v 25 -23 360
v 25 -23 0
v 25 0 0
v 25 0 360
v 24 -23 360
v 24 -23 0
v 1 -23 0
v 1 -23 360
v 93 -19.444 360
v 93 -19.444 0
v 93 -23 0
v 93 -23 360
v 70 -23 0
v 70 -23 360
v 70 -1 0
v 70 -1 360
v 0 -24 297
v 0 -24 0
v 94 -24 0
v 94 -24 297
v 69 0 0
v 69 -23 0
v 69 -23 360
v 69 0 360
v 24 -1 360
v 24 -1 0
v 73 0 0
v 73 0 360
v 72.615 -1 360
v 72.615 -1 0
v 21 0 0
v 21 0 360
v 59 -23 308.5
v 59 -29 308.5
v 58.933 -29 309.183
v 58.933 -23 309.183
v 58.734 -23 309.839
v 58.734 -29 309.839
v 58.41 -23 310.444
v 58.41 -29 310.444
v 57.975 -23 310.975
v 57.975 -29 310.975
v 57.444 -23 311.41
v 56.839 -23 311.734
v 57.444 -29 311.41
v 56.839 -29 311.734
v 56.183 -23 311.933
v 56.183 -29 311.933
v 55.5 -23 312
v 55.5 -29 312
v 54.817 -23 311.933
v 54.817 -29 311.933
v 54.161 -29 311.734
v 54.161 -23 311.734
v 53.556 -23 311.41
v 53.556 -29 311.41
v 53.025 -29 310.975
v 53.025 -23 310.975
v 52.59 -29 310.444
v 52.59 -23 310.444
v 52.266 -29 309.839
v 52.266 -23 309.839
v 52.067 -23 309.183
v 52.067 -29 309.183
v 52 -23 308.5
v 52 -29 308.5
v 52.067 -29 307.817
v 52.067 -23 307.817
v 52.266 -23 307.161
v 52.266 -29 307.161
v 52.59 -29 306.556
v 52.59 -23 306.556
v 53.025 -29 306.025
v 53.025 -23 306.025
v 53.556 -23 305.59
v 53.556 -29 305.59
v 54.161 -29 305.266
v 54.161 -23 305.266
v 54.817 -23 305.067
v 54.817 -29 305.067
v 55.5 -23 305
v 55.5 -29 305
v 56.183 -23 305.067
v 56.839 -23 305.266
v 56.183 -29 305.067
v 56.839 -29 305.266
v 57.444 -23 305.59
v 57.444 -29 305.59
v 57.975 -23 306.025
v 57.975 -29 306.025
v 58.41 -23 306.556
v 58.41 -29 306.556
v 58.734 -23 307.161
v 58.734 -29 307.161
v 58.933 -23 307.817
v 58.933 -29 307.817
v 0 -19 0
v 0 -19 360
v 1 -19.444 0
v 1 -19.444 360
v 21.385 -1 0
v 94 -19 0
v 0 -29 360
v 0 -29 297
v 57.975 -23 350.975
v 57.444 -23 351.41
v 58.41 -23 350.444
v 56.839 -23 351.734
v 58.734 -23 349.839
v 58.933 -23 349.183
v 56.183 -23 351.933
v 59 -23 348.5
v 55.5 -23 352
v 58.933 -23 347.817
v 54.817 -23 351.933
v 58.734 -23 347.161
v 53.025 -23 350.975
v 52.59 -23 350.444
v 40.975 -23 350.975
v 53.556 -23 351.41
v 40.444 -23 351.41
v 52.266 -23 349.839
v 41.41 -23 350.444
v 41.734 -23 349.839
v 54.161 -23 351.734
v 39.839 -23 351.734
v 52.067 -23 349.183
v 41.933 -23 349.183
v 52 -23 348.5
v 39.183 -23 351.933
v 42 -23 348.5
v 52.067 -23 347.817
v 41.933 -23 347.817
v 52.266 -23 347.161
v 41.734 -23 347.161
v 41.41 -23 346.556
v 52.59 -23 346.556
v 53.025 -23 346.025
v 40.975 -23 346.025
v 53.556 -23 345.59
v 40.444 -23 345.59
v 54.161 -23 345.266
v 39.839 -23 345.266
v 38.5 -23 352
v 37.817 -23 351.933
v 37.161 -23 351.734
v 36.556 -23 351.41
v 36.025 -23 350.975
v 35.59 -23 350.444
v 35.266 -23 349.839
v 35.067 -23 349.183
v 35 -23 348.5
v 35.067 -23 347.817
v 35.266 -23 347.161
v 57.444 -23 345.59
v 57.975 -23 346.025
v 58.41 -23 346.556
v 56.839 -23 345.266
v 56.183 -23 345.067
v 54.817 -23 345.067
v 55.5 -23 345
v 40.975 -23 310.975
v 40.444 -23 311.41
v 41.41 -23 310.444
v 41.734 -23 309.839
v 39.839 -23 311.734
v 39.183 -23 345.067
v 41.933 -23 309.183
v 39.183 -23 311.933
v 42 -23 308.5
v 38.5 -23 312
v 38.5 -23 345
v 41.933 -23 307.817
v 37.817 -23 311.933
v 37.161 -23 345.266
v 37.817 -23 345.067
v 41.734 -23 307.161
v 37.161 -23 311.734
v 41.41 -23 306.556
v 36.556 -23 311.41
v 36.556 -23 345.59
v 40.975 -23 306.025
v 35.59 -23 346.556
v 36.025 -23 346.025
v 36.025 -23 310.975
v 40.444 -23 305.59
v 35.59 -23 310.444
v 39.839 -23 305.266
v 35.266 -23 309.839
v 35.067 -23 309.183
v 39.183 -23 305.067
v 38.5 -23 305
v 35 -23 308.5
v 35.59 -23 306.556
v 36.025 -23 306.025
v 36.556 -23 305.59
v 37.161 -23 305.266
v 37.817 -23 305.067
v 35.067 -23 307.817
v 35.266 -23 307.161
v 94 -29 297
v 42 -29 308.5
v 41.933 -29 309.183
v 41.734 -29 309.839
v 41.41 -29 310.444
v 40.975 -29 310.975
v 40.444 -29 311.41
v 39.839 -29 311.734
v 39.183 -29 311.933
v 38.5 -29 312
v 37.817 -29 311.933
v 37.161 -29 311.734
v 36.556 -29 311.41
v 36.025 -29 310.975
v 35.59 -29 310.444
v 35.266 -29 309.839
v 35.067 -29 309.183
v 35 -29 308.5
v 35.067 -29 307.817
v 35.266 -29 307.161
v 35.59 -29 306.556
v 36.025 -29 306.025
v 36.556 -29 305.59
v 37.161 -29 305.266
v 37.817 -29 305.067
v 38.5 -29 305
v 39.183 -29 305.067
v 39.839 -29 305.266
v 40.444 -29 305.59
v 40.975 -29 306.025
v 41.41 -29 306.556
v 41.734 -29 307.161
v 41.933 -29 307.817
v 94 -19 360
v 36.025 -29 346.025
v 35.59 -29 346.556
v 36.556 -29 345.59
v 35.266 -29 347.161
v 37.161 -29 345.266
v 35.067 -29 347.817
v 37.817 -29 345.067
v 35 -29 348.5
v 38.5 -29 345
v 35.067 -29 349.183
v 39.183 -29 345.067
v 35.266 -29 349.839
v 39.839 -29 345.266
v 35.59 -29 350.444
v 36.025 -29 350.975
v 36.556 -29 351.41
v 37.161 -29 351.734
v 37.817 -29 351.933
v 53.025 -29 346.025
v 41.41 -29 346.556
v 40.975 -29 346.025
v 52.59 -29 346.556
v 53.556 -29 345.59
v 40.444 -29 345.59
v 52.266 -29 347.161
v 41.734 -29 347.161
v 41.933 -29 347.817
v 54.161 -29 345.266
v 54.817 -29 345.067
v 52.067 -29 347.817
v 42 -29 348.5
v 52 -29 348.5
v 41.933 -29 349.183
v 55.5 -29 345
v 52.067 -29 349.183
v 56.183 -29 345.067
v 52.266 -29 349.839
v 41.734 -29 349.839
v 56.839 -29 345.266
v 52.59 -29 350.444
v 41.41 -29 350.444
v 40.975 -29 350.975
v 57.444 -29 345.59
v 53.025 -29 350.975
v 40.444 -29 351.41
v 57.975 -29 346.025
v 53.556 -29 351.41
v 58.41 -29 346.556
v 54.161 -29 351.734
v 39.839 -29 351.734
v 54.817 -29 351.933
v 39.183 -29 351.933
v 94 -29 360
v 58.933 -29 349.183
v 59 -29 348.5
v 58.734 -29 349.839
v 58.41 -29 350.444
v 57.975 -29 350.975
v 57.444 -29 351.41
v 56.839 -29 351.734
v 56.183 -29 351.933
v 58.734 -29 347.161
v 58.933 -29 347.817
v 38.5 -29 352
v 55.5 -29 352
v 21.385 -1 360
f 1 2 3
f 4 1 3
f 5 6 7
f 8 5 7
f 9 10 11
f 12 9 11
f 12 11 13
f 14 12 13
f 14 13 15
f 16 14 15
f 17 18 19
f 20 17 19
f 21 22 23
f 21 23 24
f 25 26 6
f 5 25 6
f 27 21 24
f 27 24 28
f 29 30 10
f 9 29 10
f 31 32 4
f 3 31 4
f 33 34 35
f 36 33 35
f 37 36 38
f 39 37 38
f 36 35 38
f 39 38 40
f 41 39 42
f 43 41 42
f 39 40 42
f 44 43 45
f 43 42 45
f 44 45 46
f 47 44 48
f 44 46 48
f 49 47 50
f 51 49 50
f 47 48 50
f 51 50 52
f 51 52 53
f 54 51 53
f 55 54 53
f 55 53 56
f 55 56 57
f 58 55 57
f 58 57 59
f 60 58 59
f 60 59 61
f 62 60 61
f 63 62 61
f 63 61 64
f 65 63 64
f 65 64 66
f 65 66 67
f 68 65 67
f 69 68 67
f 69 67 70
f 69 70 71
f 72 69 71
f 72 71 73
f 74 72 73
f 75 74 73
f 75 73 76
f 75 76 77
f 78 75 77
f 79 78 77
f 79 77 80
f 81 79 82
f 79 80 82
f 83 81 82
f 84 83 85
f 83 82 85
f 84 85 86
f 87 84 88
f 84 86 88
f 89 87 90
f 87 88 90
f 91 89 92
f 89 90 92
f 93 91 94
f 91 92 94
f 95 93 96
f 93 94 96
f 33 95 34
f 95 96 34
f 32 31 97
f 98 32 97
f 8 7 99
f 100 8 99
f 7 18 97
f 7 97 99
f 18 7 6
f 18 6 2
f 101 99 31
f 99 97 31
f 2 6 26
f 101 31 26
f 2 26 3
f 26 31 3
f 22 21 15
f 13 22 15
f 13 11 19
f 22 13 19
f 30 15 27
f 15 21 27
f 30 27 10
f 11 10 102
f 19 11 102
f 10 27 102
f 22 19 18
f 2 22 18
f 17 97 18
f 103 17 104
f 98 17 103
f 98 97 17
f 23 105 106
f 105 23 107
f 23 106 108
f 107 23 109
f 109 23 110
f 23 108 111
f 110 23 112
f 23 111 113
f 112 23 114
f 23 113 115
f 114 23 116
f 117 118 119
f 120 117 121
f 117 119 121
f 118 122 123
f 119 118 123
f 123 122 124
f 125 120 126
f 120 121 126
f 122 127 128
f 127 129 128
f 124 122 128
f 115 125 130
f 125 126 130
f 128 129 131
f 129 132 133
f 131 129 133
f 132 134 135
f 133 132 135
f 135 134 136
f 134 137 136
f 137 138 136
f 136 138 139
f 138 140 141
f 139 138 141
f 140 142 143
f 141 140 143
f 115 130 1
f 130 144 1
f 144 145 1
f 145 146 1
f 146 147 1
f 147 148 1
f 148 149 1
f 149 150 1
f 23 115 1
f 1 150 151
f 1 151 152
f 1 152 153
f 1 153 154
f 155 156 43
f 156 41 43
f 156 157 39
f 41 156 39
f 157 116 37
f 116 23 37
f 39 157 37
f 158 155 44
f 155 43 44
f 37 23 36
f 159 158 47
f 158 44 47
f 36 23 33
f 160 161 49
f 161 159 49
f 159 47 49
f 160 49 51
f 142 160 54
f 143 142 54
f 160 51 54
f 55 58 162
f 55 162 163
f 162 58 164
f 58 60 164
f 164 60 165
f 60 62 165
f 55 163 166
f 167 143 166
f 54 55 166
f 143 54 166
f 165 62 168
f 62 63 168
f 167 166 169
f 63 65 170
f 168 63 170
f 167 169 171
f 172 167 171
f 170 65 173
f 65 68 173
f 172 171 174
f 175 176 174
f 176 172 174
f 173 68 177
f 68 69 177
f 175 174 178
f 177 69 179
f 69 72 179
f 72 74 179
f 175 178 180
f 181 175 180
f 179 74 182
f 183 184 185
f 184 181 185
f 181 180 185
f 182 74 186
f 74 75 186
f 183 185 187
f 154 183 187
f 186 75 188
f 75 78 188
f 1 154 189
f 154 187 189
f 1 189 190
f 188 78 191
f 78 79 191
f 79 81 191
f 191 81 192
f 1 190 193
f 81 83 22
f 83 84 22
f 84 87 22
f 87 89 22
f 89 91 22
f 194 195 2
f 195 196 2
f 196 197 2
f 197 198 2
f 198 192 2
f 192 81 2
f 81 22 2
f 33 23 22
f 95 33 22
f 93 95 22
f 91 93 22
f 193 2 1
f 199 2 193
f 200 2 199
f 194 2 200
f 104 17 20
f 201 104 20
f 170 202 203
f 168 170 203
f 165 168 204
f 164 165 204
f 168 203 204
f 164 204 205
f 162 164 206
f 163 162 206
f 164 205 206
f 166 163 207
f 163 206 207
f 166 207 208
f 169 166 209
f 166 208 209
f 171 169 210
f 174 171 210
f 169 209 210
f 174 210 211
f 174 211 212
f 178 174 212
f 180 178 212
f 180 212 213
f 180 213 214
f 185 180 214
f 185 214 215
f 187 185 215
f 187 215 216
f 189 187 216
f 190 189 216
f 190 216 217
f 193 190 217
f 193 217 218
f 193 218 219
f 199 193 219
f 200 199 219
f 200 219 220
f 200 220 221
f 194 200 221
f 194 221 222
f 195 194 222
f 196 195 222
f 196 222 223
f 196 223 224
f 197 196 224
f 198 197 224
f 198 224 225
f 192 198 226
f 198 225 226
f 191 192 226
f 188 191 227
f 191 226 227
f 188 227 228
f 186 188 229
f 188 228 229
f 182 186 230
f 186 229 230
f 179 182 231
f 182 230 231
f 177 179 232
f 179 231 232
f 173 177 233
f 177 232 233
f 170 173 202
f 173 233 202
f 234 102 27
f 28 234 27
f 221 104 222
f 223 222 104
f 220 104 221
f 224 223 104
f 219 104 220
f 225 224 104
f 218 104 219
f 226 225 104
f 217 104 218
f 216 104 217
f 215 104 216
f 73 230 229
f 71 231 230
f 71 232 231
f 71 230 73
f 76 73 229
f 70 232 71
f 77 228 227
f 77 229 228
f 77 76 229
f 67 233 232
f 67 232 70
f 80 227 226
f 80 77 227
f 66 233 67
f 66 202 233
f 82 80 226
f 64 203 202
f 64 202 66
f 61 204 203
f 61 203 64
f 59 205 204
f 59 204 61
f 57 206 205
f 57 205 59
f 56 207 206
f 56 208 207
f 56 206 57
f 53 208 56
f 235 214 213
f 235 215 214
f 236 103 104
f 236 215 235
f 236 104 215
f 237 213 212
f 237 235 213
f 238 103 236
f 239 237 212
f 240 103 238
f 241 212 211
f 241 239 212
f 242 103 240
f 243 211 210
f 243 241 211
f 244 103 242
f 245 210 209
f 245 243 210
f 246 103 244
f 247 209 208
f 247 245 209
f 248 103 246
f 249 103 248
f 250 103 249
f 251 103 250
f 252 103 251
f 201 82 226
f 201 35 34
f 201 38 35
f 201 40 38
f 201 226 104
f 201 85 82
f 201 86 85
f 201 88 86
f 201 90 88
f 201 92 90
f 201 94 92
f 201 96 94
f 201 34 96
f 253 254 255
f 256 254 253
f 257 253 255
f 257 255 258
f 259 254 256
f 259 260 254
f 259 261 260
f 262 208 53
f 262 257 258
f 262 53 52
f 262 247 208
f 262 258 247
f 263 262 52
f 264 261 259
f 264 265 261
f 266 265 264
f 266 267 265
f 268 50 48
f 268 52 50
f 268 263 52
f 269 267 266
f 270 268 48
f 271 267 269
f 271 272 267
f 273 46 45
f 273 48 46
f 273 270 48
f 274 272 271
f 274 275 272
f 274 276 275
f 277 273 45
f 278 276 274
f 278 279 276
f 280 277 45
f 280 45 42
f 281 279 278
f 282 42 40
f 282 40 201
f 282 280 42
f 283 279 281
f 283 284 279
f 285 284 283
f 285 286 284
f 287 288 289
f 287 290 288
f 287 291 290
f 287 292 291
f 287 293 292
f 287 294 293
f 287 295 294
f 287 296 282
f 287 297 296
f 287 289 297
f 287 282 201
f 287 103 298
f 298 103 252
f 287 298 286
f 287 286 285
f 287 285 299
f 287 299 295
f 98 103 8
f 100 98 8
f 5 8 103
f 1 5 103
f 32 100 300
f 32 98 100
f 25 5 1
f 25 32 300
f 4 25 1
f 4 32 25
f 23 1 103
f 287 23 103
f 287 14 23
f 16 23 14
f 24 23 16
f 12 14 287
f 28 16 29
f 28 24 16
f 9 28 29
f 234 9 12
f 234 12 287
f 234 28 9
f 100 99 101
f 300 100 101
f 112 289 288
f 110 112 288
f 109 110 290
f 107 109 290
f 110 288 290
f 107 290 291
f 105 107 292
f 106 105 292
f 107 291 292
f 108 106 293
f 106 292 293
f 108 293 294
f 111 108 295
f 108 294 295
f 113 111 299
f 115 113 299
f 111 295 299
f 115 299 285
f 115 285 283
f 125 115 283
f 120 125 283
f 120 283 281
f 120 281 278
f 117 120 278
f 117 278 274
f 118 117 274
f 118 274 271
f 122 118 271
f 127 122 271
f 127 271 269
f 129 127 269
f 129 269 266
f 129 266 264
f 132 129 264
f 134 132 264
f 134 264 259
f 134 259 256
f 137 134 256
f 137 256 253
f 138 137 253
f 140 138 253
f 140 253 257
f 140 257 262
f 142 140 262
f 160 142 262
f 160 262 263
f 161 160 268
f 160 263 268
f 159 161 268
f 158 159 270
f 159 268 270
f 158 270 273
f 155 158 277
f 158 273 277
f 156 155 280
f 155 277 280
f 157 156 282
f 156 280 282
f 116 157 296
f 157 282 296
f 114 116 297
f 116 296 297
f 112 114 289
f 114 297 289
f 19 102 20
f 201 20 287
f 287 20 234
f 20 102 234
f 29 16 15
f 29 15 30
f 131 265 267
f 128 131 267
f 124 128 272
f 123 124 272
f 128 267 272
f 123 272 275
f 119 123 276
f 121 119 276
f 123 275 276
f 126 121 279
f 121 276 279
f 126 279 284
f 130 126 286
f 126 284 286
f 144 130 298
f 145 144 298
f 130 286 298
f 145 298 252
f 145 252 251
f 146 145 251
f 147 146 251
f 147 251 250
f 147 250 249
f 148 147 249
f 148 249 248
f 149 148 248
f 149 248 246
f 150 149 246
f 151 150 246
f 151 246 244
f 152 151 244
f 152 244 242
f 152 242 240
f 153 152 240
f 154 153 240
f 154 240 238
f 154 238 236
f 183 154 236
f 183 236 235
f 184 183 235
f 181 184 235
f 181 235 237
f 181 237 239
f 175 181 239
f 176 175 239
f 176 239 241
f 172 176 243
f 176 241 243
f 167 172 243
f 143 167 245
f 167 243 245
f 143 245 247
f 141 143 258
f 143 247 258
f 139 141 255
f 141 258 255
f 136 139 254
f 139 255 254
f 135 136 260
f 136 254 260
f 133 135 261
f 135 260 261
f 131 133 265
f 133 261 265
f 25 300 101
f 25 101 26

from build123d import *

# Parameters (mm, degrees)
CROQUIS2_W              = 94
CROQUIS2_H              = 24
SALIENTE_EXTRUIR1_DEPTH = 360
CROQUIS4_W              = 44
CROQUIS4_H              = 23
CORTAR_EXTRUIR2_DEPTH   = 360
CORTAR_EXTRUIR3_DEPTH   = 360
CORTAR_EXTRUIR5_DEPTH   = 360
CROQUIS8_W              = 94
CROQUIS8_H              = 63
SALIENTE_EXTRUIR2_DEPTH = 5
CROQUIS9_R              = 3.5
CORTAR_EXTRUIR6_DEPTH   = 30


with BuildPart() as part:
    # Croquis2 → Saliente-Extruir1 (new body)
    with BuildSketch(Plane.XY):
        with Locations((47, -12)):
            Rectangle(CROQUIS2_W, CROQUIS2_H)
    extrude(amount=SALIENTE_EXTRUIR1_DEPTH)

    # Croquis4 → Cortar-Extruir2 (cut)
    with BuildSketch(Plane(origin=(0, 0, 0), x_dir=(-1, 0, 0), z_dir=(0, 0, -1))):
        Polygon((-94, 0), (-94, -19), (-73, 0), align=None)
        with Locations((-47, -11.5)):
            Rectangle(CROQUIS4_W, CROQUIS4_H)
        Polygon((0, 0), (-21, 0), (0, -19), align=None)
    extrude(amount=-CORTAR_EXTRUIR2_DEPTH, mode=Mode.SUBTRACT)

    # Croquis6 → Cortar-Extruir3 (cut)
    with BuildSketch(Plane(origin=(0, 0, 0), x_dir=(-1, 0, 0), z_dir=(0, 0, -1))):
        Polygon((-70, -23), (-70, -1), (-72.614757657, -1), (-93, -19.443790691), (-93, -23), align=None)
    extrude(amount=-CORTAR_EXTRUIR3_DEPTH, mode=Mode.SUBTRACT)

    # Croquis7 → Cortar-Extruir5 (cut)
    with BuildSketch(Plane(origin=(0, 0, 0), x_dir=(-1, 0, 0), z_dir=(0, 0, -1))):
        Polygon((-1, -19.443790691), (-21.385242343, -1), (-24, -1), (-24, -23), (-1, -23), align=None)
    extrude(amount=-CORTAR_EXTRUIR5_DEPTH, mode=Mode.SUBTRACT)

    # Croquis8 → Saliente-Extruir2 (add)
    with BuildSketch(Plane.XZ.offset(24)):
        with Locations((47, 328.5)):
            Rectangle(CROQUIS8_W, CROQUIS8_H)
    extrude(amount=SALIENTE_EXTRUIR2_DEPTH)

    # Croquis9 → Cortar-Extruir6 (cut, through all)
    with BuildSketch(Plane.XZ.offset(29)):
        with Locations((38.5, 348.5)):
            Circle(CROQUIS9_R)
        with Locations((55.5, 348.5)):
            Circle(CROQUIS9_R)
        with Locations((38.5, 308.5)):
            Circle(CROQUIS9_R)
        with Locations((55.5, 308.5)):
            Circle(CROQUIS9_R)
    extrude(amount=-CORTAR_EXTRUIR6_DEPTH, mode=Mode.SUBTRACT)


solid = part.part
